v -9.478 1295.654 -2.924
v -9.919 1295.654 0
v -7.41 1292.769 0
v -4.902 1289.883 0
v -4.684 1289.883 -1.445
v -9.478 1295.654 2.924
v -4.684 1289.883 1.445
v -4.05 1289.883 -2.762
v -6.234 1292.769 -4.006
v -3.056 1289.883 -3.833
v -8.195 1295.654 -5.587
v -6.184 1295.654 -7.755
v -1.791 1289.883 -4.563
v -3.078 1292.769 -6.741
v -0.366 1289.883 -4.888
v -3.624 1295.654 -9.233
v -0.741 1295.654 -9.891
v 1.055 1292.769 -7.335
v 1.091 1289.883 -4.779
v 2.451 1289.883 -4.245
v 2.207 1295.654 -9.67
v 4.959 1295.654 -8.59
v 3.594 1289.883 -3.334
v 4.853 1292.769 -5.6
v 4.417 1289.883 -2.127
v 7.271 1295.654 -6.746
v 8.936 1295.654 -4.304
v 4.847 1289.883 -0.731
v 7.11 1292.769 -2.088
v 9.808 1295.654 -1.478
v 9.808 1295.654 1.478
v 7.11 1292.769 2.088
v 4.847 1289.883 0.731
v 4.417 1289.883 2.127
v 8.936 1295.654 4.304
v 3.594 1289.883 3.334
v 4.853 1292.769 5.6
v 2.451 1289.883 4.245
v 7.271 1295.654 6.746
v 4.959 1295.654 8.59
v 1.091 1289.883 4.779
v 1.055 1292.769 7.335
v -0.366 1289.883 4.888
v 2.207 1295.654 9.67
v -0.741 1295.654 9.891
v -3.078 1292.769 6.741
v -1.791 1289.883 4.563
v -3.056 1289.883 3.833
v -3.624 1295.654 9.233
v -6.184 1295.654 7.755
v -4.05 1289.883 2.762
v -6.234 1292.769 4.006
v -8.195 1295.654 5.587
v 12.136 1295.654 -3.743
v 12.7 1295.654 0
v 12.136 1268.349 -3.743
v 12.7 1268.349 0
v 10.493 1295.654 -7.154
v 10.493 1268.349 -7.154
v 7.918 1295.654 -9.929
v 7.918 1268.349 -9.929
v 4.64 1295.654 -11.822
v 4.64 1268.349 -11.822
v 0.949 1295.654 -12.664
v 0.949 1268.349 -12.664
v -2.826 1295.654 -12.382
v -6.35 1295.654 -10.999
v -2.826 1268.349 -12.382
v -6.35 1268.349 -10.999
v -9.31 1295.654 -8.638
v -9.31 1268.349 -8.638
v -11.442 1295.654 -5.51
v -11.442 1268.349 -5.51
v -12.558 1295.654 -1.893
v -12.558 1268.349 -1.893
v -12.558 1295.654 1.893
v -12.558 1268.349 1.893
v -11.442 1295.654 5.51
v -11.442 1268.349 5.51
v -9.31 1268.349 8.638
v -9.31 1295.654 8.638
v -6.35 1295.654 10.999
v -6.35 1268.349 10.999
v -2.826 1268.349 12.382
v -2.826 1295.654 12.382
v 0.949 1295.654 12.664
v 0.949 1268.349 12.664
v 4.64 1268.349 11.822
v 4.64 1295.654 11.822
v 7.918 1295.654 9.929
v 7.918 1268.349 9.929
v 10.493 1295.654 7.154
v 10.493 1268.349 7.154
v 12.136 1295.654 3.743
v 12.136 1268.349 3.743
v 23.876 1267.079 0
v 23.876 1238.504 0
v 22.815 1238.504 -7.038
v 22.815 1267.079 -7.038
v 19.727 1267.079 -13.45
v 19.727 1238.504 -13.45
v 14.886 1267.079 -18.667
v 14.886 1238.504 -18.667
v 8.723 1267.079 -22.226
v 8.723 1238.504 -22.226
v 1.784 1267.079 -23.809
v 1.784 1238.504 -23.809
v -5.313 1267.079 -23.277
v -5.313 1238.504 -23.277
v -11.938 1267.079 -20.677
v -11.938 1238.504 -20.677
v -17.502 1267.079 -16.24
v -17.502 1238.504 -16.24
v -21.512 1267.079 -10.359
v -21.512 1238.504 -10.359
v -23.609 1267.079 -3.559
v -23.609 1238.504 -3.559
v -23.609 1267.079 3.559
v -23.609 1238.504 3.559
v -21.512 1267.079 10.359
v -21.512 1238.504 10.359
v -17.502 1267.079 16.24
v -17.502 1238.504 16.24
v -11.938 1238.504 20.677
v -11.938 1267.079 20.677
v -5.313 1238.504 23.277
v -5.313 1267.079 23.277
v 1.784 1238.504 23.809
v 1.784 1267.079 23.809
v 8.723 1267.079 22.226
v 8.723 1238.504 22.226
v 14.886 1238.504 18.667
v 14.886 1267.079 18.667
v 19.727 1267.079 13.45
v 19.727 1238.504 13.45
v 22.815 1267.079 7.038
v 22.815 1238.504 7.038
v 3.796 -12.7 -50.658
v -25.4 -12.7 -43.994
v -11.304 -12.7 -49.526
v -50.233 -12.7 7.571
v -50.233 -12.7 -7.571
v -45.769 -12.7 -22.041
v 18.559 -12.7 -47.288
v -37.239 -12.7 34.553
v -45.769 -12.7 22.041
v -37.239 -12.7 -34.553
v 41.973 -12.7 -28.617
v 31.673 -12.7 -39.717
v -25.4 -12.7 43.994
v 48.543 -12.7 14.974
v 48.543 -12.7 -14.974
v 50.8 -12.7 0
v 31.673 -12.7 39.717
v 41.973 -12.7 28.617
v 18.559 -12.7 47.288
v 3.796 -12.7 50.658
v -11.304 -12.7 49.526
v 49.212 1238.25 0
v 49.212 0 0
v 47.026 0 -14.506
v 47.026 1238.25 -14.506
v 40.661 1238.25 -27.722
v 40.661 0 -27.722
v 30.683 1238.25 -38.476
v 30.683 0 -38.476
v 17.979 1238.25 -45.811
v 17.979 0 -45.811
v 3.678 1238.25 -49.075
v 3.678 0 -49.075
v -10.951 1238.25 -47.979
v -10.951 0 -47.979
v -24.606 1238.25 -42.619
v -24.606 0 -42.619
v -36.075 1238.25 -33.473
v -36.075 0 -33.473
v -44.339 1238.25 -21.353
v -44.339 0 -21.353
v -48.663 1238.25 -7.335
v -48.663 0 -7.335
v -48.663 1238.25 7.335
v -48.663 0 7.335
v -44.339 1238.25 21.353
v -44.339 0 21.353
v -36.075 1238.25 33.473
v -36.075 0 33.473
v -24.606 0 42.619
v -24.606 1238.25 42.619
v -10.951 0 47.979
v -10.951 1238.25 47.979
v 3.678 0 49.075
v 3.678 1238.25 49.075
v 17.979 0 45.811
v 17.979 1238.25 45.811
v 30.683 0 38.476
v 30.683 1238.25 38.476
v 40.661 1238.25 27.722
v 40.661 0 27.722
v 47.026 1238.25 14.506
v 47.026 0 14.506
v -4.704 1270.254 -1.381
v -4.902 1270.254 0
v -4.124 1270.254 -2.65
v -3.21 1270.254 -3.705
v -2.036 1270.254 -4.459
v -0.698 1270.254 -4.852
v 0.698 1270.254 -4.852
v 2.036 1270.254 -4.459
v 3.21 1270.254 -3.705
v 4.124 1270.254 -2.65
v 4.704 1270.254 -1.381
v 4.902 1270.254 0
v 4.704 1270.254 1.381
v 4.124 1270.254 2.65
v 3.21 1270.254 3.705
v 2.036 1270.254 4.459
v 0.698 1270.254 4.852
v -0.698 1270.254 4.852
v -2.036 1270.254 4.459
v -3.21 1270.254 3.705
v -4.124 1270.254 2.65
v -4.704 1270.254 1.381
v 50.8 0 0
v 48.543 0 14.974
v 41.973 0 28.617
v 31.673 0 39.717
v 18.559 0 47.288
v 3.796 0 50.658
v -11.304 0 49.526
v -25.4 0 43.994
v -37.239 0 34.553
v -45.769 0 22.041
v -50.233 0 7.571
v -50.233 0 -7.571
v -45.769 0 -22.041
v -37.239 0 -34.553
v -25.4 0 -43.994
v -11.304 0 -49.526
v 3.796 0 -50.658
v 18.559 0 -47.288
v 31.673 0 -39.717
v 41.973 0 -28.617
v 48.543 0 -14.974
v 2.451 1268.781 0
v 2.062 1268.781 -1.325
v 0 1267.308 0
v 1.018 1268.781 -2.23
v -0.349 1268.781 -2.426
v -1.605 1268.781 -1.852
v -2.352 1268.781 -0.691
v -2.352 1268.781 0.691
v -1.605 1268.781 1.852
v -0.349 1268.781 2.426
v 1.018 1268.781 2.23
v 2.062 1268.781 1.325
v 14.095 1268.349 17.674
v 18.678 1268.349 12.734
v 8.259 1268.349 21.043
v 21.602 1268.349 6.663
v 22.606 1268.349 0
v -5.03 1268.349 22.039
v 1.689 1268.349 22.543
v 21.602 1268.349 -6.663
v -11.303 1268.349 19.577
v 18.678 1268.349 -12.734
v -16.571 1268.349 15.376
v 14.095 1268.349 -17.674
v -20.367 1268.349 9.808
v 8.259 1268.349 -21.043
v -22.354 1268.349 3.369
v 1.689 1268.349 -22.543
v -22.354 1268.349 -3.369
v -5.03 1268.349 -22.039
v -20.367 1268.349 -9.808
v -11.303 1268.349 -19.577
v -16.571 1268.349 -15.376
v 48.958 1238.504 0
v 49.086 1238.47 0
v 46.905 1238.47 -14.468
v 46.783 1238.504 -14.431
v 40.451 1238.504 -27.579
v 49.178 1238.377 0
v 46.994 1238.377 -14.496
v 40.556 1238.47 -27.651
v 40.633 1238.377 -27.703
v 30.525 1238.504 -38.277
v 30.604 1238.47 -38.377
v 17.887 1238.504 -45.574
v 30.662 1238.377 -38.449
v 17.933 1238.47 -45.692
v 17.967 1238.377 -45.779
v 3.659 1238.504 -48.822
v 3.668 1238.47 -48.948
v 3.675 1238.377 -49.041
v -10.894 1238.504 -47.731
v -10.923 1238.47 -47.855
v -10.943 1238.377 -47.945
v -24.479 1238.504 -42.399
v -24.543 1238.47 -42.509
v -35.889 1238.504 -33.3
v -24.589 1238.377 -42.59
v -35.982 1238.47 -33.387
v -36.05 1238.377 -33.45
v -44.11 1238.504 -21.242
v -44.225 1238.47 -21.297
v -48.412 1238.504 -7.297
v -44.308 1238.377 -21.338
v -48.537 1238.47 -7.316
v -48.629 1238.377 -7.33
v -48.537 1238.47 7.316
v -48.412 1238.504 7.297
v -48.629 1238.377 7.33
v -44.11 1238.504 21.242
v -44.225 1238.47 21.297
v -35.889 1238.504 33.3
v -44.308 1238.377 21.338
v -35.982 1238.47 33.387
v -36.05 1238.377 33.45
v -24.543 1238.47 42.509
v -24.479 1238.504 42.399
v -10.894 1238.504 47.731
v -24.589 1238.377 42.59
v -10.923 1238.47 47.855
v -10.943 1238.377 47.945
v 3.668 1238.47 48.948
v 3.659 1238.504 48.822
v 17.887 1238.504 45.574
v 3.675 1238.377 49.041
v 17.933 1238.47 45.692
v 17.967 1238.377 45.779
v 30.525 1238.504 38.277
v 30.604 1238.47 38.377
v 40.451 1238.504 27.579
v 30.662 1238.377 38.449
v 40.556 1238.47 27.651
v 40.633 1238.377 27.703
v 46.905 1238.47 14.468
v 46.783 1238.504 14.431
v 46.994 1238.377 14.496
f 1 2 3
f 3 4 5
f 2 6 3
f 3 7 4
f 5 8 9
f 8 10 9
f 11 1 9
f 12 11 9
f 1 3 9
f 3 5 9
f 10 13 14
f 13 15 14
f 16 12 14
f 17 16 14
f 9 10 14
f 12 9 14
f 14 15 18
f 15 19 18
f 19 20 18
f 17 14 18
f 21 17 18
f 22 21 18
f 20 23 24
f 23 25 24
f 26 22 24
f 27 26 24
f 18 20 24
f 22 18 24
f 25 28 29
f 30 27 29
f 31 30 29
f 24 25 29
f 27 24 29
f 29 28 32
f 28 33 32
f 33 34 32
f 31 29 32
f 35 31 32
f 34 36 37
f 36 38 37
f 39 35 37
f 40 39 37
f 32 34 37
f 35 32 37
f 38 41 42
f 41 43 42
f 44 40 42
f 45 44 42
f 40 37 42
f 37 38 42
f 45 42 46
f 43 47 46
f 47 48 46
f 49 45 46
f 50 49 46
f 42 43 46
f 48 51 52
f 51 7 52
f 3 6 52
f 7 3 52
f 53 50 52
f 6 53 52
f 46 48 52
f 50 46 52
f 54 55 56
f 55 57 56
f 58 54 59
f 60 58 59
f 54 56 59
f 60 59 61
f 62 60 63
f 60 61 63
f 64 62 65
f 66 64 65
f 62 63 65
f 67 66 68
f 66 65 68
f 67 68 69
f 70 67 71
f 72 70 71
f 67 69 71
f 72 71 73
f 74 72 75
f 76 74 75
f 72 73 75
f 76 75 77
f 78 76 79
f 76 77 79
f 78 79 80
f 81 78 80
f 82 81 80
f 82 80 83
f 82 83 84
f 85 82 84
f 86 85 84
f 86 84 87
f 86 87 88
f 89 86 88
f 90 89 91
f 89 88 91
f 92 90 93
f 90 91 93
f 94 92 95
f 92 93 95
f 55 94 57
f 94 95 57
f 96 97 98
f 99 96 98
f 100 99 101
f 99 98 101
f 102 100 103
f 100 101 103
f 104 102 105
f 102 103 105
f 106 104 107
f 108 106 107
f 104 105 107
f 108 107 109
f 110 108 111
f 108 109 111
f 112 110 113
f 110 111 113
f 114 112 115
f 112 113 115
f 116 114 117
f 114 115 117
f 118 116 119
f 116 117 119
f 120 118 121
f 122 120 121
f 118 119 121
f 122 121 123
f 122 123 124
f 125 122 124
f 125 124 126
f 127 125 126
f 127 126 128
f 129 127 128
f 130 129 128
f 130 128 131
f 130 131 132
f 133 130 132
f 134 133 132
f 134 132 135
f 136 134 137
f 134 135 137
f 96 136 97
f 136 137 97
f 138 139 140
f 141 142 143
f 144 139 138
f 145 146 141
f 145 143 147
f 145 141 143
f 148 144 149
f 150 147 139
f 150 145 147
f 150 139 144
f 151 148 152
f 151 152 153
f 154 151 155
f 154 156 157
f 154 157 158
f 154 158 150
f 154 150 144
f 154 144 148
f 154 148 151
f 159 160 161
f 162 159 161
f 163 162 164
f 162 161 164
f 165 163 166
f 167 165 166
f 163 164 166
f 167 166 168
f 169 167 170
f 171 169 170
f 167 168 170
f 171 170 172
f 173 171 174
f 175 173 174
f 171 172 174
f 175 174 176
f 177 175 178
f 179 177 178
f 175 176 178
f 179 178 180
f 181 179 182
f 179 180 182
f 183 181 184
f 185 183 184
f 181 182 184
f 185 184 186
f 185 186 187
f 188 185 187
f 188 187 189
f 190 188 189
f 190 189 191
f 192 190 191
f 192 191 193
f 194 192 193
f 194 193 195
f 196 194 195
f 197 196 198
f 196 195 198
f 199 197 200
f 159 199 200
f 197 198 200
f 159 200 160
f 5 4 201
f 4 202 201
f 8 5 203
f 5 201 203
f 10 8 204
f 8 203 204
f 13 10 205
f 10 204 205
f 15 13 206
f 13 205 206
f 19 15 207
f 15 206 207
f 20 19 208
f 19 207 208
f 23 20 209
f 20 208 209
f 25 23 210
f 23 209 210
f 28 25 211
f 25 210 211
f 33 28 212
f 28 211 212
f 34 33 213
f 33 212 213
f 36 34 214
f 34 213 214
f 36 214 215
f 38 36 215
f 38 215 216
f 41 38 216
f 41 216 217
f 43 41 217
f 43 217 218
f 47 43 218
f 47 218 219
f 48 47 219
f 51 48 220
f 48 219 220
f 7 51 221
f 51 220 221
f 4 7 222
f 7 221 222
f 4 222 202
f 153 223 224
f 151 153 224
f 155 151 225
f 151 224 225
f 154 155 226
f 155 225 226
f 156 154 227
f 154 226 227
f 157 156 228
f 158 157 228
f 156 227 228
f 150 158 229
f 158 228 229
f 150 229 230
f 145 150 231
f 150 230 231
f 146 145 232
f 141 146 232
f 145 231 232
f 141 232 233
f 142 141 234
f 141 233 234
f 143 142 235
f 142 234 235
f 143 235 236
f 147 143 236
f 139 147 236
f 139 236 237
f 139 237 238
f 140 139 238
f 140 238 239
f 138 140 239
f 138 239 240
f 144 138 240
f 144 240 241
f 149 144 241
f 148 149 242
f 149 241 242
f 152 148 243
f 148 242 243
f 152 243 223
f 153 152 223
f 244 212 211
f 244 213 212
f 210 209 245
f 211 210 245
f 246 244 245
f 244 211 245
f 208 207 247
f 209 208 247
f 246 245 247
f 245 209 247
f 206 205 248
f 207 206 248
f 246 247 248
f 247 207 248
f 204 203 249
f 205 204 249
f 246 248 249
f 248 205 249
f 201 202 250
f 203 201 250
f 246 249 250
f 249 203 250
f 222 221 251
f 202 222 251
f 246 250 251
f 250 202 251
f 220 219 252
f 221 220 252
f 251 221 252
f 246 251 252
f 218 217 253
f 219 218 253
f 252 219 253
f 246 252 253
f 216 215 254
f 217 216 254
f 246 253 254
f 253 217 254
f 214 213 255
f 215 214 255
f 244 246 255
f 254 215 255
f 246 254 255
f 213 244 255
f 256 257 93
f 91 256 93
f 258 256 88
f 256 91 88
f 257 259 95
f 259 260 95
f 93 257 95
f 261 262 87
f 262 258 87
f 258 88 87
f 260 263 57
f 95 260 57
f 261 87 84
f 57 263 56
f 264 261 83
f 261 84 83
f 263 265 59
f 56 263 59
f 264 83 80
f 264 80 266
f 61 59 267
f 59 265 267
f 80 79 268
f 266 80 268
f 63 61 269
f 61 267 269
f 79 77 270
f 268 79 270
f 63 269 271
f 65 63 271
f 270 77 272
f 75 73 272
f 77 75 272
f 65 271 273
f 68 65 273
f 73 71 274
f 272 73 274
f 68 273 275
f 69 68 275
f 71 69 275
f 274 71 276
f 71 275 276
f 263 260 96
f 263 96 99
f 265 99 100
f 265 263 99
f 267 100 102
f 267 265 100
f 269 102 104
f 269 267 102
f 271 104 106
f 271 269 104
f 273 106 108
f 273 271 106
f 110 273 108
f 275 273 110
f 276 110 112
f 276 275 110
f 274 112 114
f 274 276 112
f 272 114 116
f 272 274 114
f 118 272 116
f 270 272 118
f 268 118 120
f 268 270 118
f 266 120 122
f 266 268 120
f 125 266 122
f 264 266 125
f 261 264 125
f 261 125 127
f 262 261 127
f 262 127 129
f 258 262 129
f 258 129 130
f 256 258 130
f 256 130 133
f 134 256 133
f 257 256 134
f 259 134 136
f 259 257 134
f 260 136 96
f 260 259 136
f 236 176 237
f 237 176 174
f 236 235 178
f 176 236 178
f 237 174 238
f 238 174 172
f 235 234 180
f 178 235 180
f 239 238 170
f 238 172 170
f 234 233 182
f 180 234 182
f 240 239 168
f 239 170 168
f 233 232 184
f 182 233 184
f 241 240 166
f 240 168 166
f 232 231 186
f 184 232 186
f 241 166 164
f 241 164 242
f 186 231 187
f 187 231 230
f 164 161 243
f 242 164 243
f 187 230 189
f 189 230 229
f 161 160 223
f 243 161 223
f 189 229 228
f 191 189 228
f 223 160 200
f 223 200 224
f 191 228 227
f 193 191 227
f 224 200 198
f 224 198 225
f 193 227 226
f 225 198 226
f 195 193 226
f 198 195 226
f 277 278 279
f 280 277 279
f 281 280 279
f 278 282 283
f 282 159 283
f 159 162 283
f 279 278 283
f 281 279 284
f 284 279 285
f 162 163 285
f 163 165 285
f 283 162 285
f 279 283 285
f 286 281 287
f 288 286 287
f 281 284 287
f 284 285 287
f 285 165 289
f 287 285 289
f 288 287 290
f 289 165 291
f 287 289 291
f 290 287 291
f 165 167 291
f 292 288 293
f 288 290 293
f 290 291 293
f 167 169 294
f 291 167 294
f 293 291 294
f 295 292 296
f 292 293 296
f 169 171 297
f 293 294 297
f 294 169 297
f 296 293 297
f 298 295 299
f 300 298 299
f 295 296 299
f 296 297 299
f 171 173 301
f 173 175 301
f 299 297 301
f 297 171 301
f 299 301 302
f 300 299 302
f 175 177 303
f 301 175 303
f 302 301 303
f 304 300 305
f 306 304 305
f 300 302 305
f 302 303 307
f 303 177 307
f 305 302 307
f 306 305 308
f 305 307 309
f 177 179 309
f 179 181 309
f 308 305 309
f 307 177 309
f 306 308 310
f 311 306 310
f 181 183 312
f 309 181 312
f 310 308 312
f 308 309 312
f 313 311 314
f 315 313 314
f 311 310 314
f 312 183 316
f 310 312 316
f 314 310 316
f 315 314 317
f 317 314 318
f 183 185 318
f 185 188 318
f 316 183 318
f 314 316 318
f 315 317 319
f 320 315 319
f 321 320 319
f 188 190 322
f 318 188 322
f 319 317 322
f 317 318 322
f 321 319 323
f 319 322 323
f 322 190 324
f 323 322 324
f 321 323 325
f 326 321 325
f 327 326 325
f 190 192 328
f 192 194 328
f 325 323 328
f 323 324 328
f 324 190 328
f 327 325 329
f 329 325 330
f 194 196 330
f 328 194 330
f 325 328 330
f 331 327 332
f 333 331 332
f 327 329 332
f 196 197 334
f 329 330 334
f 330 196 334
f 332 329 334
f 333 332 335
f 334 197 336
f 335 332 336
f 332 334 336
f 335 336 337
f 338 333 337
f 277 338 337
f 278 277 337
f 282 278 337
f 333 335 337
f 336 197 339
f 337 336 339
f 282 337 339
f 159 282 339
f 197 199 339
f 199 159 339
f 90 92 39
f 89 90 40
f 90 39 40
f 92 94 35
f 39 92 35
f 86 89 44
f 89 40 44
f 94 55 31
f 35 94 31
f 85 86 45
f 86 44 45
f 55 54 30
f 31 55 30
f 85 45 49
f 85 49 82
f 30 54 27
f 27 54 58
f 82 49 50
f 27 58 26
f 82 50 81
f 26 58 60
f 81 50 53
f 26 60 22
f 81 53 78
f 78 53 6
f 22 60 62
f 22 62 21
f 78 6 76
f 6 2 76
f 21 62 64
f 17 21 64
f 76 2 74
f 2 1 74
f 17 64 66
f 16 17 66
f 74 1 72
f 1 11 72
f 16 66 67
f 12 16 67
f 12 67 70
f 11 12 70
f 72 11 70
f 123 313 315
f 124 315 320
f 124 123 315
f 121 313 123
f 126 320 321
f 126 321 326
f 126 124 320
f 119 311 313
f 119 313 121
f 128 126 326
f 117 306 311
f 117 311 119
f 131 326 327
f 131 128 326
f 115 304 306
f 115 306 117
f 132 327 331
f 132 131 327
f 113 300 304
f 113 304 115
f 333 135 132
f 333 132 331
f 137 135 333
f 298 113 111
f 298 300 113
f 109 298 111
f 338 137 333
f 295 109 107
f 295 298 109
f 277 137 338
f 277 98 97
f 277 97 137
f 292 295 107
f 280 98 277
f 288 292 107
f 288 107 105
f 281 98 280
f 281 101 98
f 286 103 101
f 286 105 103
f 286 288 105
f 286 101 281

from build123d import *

# Parameters (mm, degrees)
SKETCH1_R                                           = 49.2125
BOSS_EXTRUDE1_DEPTH                                 = 1238.504
SKETCH3_R                                           = 50.8
BOSS_EXTRUDE2_DEPTH                                 = 12.7
CHAMFER1_SIZE                                       = 1.27
FILLET1_R                                           = 0.254
CSK_FOR_3_8_FLAT_HEAD_SOCKET_CAP_SCREW1_D           = 9.8044
CSK_FOR_3_8_FLAT_HEAD_SOCKET_CAP_SCREW1_DEPTH       = 25.4
CSK_FOR_3_8_FLAT_HEAD_SOCKET_CAP_SCREW1_CSINK_D     = 19.8374
CSK_FOR_3_8_FLAT_HEAD_SOCKET_CAP_SCREW1_CSINK_ANGLE = 82
CSK_FOR_3_8_FLAT_HEAD_SOCKET_CAP_SCREW1_TIP         = 2.945538927


with BuildPart() as part:
    # Sketch1 → Boss-Extrude1 (new body)
    with BuildSketch(Plane(origin=(0, 0, 0), x_dir=(1, 0, 0), z_dir=(0, 1, 0))):
        Circle(SKETCH1_R)
    extrude(amount=BOSS_EXTRUDE1_DEPTH)

    # Sketch2 → Revolve1 (revolve)
    with BuildSketch(Plane.XY):
        Polygon((0, 1238.504), (0, 1295.654), (12.7, 1295.654), (12.7, 1268.349), (23.876, 1268.349), (23.876, 1238.504), align=None)
    revolve(axis=Axis((0, 1238.504, 0), (0, 1, 0)))

    # Sketch3 → Boss-Extrude2 (add)
    with BuildSketch(Plane.XZ):
        Circle(SKETCH3_R)
    extrude(amount=BOSS_EXTRUDE2_DEPTH)

    # Chamfer1
    chamfer1_edges = [part.edges().sort_by_distance(p)[0] for p in [
        (-23.876, 1268.349, 0),
    ]]
    chamfer(chamfer1_edges, length=CHAMFER1_SIZE)

    # Fillet1
    fillet1_edges = [part.edges().sort_by_distance(p)[0] for p in [
        (-49.2125, 1238.504, 0),
    ]]
    fillet(fillet1_edges, radius=FILLET1_R)

    # CSK for 3/8 Flat Head Socket Cap Screw1
    with Locations(Plane(origin=(0, 1295.654, 0), x_dir=(1, 0, 0), z_dir=(0, 1, 0))):
        with Locations((0, 0)):
            CounterSinkHole(CSK_FOR_3_8_FLAT_HEAD_SOCKET_CAP_SCREW1_D / 2, CSK_FOR_3_8_FLAT_HEAD_SOCKET_CAP_SCREW1_CSINK_D / 2, depth=CSK_FOR_3_8_FLAT_HEAD_SOCKET_CAP_SCREW1_DEPTH, counter_sink_angle=CSK_FOR_3_8_FLAT_HEAD_SOCKET_CAP_SCREW1_CSINK_ANGLE)
            with Locations((0, 0, -(CSK_FOR_3_8_FLAT_HEAD_SOCKET_CAP_SCREW1_DEPTH + CSK_FOR_3_8_FLAT_HEAD_SOCKET_CAP_SCREW1_TIP / 2))):  # 118° drill point
                Cone(0, CSK_FOR_3_8_FLAT_HEAD_SOCKET_CAP_SCREW1_D / 2, CSK_FOR_3_8_FLAT_HEAD_SOCKET_CAP_SCREW1_TIP, mode=Mode.SUBTRACT)


solid = part.part
